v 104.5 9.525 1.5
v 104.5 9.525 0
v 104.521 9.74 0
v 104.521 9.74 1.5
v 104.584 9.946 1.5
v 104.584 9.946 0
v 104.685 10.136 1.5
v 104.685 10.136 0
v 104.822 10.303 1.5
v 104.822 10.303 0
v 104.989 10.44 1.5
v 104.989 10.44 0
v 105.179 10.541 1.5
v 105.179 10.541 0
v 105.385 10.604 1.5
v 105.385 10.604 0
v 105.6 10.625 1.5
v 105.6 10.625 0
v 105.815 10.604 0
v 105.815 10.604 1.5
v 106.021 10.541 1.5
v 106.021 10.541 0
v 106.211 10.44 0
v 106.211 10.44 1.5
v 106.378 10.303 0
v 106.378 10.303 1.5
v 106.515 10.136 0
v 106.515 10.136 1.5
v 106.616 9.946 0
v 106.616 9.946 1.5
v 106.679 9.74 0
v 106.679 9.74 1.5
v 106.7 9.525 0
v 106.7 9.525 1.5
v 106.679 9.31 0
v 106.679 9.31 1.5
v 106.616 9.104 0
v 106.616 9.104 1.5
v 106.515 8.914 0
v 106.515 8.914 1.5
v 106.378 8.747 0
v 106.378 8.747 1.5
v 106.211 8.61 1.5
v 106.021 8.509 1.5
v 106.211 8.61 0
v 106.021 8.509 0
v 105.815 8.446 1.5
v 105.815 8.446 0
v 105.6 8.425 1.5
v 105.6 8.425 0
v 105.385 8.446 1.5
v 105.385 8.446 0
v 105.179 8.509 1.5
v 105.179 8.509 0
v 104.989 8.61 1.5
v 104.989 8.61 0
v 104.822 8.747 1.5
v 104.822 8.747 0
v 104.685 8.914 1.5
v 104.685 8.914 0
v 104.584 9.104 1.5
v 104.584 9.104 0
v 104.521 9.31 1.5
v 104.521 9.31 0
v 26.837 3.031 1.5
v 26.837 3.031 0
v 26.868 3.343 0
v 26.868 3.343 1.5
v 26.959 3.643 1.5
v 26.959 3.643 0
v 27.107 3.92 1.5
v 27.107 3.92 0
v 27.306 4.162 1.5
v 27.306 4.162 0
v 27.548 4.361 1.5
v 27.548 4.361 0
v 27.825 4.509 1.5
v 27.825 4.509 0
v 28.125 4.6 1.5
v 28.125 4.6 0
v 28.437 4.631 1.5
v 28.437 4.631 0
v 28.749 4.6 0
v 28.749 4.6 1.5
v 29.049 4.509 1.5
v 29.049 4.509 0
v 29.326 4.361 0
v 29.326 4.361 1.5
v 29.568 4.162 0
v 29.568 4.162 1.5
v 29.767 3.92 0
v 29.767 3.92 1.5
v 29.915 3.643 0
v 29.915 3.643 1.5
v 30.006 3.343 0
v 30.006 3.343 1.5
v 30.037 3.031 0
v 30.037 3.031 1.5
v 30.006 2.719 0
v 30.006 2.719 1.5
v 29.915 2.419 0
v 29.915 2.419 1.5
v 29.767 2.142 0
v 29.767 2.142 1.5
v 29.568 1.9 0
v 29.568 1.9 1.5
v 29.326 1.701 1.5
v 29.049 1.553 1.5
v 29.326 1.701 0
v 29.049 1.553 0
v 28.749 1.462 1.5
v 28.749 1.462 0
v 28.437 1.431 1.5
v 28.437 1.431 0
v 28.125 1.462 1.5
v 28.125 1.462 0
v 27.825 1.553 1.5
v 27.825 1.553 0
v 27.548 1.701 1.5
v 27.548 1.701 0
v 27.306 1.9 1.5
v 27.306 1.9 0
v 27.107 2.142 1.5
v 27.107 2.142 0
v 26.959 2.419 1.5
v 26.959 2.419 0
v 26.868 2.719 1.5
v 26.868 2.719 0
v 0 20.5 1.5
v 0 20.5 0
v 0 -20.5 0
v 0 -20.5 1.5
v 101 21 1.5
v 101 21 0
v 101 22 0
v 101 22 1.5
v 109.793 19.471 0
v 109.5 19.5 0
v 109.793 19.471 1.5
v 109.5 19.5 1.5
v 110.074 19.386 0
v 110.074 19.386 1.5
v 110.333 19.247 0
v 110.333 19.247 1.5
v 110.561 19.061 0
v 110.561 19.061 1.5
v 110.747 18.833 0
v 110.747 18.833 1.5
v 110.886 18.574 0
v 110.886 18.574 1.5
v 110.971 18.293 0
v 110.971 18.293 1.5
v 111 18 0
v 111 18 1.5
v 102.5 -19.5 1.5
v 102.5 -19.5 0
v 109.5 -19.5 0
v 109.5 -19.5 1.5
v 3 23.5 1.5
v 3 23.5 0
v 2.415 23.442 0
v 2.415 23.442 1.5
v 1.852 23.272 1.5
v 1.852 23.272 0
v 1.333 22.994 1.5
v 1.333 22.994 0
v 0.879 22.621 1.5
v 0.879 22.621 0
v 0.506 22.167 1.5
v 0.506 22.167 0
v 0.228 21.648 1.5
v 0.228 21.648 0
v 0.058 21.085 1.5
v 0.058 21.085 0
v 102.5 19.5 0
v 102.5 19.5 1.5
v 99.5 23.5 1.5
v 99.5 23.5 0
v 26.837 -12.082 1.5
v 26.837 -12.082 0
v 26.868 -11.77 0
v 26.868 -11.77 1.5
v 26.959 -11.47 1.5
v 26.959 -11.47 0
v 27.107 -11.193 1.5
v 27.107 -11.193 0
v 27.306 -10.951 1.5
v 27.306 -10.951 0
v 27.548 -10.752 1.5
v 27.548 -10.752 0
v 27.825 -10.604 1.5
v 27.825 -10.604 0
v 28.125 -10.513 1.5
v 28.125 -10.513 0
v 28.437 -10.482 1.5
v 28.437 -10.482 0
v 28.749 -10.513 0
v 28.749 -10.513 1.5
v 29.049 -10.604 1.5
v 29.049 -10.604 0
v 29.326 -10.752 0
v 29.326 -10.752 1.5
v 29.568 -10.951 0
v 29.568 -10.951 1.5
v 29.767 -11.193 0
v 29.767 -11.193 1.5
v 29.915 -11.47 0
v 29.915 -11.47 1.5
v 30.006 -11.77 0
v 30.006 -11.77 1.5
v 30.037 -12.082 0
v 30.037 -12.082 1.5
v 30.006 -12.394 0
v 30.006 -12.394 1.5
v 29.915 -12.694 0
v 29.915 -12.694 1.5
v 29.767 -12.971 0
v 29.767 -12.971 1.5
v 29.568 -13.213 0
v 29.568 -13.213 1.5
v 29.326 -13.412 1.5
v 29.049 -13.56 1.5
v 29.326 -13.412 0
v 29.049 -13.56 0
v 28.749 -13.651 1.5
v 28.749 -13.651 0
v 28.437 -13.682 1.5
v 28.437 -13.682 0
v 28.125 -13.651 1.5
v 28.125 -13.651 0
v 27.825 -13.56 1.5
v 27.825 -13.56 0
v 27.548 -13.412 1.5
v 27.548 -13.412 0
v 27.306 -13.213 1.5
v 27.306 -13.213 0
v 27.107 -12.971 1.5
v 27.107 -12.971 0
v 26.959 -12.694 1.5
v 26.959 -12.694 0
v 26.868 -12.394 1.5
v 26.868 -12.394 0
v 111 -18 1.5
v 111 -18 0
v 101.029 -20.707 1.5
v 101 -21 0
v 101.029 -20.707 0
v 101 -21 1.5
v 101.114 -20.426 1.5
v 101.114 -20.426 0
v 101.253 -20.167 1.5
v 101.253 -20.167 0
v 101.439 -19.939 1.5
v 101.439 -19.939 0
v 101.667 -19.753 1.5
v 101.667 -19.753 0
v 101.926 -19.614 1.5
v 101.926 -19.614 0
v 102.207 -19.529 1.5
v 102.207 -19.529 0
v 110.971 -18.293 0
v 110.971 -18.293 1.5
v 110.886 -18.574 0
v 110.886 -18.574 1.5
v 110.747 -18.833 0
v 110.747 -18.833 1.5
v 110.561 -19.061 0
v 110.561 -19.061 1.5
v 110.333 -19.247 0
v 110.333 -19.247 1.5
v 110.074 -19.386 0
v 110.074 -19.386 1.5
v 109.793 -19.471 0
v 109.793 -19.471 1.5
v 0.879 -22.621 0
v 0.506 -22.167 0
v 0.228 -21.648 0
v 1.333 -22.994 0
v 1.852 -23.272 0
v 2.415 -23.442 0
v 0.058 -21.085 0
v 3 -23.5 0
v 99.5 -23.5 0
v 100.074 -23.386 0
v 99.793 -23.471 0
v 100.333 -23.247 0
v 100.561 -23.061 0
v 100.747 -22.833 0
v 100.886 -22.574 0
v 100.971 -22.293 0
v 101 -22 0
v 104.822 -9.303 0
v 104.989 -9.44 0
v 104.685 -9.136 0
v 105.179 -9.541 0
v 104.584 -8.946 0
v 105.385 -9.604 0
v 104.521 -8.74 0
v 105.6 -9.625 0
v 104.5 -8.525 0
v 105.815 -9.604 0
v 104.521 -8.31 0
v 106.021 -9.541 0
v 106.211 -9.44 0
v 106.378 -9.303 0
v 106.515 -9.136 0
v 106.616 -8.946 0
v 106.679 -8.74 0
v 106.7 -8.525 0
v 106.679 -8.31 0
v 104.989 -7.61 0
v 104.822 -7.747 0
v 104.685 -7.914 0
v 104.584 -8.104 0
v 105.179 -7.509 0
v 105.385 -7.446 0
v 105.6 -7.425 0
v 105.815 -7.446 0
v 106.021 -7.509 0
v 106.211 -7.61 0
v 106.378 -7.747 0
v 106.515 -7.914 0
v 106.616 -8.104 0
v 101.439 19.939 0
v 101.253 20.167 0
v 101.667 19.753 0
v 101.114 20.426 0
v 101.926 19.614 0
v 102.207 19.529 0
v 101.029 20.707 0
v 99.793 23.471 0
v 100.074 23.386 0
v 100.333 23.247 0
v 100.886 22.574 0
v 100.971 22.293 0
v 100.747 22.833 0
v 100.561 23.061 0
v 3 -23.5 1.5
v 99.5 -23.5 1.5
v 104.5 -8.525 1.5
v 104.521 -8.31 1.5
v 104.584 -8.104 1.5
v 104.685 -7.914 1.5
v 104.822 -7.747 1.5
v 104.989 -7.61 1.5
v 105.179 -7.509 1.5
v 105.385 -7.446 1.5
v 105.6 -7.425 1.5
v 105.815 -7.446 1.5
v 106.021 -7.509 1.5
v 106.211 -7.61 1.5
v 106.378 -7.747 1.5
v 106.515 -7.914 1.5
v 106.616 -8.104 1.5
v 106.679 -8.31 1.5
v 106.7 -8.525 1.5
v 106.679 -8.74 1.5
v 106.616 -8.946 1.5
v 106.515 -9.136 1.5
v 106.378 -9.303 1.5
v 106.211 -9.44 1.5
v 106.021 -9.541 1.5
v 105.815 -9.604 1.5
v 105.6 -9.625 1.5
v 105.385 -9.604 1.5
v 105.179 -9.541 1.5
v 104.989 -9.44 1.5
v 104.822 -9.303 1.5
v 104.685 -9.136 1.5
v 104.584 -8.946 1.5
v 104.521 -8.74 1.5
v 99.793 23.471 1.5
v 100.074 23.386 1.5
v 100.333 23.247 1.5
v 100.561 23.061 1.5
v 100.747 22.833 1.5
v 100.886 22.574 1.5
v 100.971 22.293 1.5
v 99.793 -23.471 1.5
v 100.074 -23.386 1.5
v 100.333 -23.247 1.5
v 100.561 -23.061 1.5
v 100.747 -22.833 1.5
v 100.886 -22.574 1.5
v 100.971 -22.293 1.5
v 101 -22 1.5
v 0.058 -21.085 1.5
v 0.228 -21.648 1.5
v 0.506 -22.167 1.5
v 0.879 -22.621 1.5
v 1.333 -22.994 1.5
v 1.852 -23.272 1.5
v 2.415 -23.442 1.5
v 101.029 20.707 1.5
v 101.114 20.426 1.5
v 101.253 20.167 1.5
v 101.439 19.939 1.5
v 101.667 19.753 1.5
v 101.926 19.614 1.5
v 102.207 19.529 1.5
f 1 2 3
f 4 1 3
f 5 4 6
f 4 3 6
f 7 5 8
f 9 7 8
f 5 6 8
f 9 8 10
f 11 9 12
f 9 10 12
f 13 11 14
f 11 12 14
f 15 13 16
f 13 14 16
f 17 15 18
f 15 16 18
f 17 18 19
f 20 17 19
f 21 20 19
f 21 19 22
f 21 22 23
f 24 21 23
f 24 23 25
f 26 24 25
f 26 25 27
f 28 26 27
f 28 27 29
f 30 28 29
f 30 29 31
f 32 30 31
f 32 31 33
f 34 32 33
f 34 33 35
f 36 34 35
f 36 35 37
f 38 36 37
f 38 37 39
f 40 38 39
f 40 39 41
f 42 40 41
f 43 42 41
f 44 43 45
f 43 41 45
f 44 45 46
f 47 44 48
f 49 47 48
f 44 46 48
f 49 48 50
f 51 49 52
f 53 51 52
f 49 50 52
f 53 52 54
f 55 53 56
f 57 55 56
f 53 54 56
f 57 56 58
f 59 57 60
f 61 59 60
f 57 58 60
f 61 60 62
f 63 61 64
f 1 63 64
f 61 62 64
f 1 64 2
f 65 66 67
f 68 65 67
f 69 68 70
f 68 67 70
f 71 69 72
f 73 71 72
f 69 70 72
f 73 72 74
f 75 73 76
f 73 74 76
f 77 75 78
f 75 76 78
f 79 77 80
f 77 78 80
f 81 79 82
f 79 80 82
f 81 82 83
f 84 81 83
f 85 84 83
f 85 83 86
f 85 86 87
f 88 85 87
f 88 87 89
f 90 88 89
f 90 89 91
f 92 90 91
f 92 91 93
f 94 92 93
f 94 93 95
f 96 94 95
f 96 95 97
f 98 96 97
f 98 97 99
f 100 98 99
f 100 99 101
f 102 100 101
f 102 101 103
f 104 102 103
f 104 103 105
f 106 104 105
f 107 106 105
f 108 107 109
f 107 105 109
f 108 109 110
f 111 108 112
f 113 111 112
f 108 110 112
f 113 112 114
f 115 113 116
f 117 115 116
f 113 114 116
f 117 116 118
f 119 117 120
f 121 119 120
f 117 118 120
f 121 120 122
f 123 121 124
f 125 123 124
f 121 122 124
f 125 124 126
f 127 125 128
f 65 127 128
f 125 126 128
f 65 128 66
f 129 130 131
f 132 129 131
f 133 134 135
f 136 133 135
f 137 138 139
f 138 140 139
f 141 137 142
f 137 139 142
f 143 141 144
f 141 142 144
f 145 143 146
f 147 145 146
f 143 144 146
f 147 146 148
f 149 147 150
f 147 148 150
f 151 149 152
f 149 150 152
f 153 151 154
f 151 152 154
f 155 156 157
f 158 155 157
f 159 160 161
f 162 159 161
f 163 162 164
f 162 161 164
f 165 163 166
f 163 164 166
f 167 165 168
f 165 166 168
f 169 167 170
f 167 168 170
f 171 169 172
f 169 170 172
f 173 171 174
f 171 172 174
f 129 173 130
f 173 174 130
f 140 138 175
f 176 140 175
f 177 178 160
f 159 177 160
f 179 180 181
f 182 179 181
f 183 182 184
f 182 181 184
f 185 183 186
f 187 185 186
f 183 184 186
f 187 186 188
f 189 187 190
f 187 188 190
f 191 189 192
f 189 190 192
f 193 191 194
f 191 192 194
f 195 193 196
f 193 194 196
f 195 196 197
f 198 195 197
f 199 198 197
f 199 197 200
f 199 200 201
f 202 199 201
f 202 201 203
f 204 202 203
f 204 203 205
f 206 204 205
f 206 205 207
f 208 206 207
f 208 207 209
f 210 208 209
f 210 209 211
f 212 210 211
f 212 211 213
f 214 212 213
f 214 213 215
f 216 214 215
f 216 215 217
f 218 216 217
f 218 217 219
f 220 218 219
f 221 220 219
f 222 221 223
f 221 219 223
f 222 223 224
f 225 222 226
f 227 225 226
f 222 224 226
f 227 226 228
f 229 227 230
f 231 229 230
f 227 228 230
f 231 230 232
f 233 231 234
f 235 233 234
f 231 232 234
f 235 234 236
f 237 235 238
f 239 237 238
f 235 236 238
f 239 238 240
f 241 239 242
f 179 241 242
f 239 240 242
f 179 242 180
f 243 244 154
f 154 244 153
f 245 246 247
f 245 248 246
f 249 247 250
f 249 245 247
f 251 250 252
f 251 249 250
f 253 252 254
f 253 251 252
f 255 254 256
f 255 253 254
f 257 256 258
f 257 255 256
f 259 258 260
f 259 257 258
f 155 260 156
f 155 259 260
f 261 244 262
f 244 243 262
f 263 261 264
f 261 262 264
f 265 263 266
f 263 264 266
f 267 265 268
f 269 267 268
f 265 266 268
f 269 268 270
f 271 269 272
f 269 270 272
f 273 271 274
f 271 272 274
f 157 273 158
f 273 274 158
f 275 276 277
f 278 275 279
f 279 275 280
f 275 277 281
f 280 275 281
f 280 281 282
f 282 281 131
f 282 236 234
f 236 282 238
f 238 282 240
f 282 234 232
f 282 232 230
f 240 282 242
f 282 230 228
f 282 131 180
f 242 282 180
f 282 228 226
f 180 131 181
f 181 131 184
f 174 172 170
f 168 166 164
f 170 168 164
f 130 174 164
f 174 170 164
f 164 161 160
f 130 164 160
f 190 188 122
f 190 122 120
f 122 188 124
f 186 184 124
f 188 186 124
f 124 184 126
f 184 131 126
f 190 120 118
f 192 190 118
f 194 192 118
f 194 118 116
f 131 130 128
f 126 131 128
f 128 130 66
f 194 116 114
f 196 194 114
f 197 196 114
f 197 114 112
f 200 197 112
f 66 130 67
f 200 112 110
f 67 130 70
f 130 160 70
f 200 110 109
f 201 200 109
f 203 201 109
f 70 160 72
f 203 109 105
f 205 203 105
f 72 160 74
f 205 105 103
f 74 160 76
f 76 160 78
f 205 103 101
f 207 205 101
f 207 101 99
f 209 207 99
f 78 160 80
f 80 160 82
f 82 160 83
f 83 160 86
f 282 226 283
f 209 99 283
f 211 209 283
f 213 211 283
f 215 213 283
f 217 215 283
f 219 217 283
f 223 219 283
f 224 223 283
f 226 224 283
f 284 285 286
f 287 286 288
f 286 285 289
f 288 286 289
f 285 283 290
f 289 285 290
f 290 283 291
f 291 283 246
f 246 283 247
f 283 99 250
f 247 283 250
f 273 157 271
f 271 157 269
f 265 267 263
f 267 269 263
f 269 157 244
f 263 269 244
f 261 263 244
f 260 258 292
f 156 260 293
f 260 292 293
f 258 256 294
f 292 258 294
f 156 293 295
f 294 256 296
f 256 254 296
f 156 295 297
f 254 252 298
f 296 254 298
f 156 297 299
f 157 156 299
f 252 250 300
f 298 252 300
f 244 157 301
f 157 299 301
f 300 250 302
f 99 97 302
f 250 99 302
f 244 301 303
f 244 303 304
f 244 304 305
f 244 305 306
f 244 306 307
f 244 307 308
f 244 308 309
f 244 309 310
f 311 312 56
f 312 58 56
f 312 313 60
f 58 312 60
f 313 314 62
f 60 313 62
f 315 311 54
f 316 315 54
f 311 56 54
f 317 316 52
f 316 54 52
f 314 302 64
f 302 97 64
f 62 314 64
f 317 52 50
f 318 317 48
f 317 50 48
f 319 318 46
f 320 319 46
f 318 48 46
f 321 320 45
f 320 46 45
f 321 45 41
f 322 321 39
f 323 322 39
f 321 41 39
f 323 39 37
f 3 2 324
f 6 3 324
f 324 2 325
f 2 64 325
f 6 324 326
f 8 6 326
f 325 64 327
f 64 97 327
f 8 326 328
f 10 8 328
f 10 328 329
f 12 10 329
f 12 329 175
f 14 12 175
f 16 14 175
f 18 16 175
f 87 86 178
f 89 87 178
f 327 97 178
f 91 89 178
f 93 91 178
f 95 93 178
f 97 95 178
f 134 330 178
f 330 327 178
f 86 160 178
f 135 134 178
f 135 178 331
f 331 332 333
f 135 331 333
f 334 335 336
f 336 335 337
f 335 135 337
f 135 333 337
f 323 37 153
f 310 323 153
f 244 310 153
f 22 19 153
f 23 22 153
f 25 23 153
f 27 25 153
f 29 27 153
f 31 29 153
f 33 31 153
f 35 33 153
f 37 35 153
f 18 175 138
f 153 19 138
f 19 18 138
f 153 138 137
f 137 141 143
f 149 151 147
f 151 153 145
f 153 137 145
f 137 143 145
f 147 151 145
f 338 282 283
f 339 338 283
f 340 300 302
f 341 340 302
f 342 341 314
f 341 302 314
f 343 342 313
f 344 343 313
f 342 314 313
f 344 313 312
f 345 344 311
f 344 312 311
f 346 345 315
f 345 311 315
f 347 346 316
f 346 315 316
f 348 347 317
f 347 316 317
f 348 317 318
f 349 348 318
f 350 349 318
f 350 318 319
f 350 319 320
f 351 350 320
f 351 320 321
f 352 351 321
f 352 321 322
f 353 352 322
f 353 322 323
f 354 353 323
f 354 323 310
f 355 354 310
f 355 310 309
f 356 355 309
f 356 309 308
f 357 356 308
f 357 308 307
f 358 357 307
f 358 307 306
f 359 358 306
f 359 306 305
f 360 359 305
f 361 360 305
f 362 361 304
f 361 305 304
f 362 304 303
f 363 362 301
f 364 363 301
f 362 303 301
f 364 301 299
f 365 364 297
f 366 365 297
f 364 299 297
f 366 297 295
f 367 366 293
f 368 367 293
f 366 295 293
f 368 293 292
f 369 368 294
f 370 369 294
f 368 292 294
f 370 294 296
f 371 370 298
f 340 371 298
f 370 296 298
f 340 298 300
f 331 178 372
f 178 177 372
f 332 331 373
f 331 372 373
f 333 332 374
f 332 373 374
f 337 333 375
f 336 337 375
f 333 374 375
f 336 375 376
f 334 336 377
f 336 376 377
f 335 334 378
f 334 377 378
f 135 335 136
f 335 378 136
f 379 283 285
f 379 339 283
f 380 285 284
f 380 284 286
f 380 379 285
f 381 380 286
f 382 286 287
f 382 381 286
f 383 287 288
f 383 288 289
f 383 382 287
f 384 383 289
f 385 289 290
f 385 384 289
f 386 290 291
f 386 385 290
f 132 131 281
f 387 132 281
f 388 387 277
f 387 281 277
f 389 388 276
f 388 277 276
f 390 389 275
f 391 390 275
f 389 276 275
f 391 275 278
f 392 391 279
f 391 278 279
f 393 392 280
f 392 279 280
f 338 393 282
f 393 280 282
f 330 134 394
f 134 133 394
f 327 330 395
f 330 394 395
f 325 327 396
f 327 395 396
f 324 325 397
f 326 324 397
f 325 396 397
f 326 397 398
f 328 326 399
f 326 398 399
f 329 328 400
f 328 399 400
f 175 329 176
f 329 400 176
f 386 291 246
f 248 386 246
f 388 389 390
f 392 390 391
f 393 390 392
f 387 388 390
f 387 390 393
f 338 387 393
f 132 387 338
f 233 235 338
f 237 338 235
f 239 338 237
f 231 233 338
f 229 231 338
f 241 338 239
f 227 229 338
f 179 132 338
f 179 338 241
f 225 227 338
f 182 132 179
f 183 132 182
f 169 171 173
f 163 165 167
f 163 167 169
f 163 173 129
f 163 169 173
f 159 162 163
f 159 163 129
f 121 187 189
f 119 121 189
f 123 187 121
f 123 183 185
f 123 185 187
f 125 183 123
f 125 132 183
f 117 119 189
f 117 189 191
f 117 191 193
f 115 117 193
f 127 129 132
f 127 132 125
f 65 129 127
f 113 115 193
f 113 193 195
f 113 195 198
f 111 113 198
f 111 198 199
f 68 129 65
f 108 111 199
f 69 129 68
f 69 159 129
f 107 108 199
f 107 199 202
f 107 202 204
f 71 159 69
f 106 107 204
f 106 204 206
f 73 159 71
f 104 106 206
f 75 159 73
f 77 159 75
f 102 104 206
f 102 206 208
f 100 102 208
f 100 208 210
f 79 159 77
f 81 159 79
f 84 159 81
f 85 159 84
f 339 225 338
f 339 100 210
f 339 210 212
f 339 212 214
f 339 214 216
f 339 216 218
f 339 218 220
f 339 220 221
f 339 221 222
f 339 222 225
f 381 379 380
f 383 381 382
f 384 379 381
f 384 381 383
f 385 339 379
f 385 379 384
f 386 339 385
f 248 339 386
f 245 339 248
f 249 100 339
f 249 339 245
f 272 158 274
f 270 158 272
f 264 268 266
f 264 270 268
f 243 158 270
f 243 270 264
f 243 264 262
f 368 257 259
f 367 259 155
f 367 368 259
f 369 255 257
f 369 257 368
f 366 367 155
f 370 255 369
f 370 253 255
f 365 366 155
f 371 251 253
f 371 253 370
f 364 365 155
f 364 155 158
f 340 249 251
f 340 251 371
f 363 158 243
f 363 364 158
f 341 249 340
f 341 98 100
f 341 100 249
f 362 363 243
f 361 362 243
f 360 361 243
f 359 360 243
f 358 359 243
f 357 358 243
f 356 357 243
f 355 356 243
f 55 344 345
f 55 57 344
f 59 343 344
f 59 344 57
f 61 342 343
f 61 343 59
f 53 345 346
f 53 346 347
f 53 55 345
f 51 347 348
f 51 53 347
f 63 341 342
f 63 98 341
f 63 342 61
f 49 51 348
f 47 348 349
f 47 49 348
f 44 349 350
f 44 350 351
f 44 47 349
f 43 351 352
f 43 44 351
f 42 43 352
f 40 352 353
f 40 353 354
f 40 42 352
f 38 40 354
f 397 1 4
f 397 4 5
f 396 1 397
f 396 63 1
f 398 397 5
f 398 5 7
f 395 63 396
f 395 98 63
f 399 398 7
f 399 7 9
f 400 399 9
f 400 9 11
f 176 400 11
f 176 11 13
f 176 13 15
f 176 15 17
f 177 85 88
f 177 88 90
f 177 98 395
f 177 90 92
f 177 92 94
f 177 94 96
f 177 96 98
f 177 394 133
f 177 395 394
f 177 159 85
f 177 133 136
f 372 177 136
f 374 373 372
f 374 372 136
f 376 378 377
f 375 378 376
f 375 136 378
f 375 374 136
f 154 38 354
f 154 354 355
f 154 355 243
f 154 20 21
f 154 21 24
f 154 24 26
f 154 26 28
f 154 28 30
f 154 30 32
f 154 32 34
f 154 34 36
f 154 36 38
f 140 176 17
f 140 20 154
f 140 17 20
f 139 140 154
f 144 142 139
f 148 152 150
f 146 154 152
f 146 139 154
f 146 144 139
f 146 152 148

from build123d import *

# Parameters (mm, degrees)
BOSS_EXTRUDE1_DEPTH  = 1.5
CUT_EXTRUDE1_DEPTH   = 114.470260421
FILLET1_R            = 1.5
M3_CLEARANCE_HOLE1_D = 3.2
M2_CLEARANCE_HOLE2_D = 2.2


with BuildPart() as part:
    # Sketch1 → Boss-Extrude1 (new body)
    with BuildSketch(Plane.XY):
        with BuildLine():
            Line((3, -23.5), (109, -23.5))
            ThreePointArc((109, -23.5), (110.414213562, -22.914213562), (111, -21.5))
            Line((111, -21.5), (111, 21.5))
            ThreePointArc((111, 21.5), (110.414213562, 22.914213562), (109, 23.5))
            Line((109, 23.5), (3, 23.5))
            ThreePointArc((3, 23.5), (0.878679656, 22.621320344), (0, 20.5))
            Line((0, 20.5), (0, -20.5))
            ThreePointArc((0, -20.5), (0.878679656, -22.621320344), (3, -23.5))
        make_face()
    extrude(amount=BOSS_EXTRUDE1_DEPTH)

    # Sketch2 → Cut-Extrude1 (cut, through all)
    with BuildSketch(Plane(origin=(0, 0, 0), x_dir=(-1, 0, 0), z_dir=(0, 0, -1))):
        with BuildLine():
            Line((-101, 19.5), (-101, 23.5))
            Line((-101, 23.5), (-109, 23.5))
            ThreePointArc((-109, 23.5), (-110.414213562, 22.914213562), (-111, 21.5))
            Line((-111, 21.5), (-111, 19.5))
            Line((-111, 19.5), (-101, 19.5))
        make_face()
        with BuildLine():
            Line((-101, -19.5), (-111, -19.5))
            Line((-111, -19.5), (-111, -21.5))
            ThreePointArc((-111, -21.5), (-110.414213562, -22.914213562), (-109, -23.5))
            Line((-109, -23.5), (-101, -23.5))
            Line((-101, -23.5), (-101, -19.5))
        make_face()
    extrude(amount=-CUT_EXTRUDE1_DEPTH, mode=Mode.SUBTRACT)

    # Fillet1
    fillet1_edges = [part.edges().sort_by_distance(p)[0] for p in [
        (101, 19.5, 0.75),
        (111, 19.5, 0.75),
        (101, 23.5, 0.75),
        (101, -23.5, 0.75),
        (111, -19.5, 0.75),
        (101, -19.5, 0.75),
    ]]
    fillet(fillet1_edges, radius=FILLET1_R)

    # M3 Clearance Hole1 (through all)
    with Locations(Plane.XY.offset(1.5)):
        with Locations((28.437, 3.0309), (28.437, -12.0821)):
            Hole(M3_CLEARANCE_HOLE1_D / 2)

    # M2 Clearance Hole2 (through all)
    with Locations(Plane.XY.offset(1.5)):
        with Locations((105.6, 9.525), (105.6, -8.525)):
            Hole(M2_CLEARANCE_HOLE2_D / 2)


solid = part.part
